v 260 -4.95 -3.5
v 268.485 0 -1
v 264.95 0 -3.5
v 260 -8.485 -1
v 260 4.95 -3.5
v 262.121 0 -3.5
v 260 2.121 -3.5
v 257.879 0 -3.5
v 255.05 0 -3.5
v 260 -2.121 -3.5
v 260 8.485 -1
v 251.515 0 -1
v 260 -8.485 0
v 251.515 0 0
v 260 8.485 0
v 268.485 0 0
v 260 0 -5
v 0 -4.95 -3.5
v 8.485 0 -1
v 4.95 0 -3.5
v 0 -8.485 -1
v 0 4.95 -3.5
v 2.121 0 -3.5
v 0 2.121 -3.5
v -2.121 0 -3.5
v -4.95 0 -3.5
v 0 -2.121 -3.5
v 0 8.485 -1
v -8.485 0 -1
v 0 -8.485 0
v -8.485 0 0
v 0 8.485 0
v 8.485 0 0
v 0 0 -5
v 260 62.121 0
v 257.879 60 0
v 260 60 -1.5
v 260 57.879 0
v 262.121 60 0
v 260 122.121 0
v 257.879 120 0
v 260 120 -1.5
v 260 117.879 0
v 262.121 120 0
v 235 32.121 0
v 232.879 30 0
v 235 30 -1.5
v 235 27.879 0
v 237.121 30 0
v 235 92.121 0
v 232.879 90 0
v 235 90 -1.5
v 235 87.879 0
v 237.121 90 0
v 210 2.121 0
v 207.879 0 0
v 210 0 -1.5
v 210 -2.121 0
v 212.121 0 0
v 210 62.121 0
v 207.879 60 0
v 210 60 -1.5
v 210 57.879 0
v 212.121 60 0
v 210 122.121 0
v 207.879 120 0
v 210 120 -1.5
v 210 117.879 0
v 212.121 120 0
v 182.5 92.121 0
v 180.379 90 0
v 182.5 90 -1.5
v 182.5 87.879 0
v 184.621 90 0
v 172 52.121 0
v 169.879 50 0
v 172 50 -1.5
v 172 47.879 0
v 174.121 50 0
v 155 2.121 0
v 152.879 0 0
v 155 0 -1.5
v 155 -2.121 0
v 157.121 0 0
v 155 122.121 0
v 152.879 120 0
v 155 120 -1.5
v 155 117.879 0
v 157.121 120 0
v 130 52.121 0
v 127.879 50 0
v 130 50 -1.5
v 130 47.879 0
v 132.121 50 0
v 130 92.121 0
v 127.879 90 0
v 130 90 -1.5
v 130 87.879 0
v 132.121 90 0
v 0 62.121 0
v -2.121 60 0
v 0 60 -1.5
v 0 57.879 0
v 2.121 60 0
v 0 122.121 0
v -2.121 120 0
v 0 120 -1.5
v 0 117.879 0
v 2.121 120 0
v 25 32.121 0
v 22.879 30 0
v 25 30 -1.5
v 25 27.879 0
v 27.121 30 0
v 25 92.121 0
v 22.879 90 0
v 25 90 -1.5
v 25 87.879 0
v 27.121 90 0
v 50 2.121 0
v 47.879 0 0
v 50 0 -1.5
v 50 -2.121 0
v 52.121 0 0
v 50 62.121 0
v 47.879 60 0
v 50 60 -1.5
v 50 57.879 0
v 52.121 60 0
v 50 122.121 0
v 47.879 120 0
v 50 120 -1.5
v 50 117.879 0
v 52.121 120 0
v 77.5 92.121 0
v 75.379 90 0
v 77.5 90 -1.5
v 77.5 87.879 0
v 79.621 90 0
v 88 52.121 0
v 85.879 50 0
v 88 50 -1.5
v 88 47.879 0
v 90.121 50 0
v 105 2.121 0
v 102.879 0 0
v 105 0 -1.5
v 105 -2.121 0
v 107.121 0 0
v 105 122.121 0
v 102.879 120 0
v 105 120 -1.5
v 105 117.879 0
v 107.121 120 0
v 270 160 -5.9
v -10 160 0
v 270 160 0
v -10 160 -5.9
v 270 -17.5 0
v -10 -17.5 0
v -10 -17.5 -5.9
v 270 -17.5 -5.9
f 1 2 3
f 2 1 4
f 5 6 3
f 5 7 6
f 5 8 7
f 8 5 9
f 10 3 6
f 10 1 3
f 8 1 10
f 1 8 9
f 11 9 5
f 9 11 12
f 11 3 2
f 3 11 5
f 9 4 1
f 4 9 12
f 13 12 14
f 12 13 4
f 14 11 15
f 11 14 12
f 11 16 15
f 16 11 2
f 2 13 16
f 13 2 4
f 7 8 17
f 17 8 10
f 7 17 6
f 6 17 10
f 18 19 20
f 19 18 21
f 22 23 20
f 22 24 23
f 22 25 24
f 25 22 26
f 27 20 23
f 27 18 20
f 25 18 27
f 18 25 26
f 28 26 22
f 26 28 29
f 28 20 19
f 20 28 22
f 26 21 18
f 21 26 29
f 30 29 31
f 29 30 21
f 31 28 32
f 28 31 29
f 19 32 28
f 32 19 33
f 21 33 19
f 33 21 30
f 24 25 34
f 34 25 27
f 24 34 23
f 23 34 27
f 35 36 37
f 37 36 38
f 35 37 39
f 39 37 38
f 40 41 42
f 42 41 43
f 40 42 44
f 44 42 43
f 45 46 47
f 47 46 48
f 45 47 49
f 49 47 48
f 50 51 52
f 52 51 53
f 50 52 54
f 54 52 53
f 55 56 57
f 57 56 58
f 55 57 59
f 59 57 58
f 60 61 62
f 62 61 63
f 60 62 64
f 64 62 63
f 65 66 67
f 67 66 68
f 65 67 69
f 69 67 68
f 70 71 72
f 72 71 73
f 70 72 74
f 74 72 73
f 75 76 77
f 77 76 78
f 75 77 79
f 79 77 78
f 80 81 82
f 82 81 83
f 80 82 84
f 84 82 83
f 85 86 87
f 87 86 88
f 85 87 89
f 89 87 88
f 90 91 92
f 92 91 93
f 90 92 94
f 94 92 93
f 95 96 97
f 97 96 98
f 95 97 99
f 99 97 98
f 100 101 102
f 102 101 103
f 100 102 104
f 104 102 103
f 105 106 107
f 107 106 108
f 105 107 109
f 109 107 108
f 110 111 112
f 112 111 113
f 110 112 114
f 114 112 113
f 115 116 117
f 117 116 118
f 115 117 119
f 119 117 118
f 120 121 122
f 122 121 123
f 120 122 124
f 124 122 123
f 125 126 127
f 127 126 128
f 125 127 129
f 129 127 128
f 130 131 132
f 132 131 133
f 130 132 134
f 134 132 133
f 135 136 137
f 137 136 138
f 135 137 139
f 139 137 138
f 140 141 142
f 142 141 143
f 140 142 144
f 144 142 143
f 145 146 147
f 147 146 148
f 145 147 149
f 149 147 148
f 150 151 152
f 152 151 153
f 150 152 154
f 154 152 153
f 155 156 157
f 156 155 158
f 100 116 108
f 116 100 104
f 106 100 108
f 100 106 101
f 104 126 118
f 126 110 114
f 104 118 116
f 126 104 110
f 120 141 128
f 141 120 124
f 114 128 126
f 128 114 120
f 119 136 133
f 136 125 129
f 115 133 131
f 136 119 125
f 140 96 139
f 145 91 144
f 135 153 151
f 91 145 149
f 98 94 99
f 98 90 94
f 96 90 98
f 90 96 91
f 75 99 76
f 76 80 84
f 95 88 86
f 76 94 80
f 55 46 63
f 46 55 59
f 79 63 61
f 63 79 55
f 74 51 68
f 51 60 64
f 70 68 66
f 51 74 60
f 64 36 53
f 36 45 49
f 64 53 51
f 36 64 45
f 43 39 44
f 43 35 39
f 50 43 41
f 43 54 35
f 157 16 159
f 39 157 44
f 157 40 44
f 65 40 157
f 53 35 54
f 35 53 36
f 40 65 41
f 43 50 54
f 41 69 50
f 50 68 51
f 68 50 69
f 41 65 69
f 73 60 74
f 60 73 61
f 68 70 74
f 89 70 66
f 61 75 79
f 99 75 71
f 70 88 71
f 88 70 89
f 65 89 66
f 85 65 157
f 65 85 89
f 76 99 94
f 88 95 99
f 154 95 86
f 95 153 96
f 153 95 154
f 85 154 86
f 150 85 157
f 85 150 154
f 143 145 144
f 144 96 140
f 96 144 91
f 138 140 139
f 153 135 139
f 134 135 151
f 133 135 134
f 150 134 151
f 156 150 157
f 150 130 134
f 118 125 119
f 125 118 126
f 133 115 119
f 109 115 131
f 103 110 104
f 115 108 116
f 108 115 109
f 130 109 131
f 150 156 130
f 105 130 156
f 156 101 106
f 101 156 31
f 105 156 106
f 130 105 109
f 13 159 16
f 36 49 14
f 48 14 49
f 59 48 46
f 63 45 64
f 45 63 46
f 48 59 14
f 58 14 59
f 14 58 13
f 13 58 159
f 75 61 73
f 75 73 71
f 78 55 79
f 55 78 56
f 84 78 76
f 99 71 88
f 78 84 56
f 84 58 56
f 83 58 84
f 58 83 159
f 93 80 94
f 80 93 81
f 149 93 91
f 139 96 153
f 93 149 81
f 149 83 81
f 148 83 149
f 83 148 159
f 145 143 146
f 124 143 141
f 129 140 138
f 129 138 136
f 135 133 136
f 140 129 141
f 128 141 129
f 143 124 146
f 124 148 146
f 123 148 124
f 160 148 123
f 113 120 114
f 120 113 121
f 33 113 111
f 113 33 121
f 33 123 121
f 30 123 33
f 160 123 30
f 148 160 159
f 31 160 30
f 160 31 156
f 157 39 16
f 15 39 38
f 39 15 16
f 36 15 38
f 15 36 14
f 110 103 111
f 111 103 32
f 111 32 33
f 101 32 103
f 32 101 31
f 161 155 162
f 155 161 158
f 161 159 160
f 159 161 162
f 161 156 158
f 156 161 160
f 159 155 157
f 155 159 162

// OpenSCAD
/*
For this file only:

MIT License

Copyright (c) 2023  Evgeny Balashov https://www.linkedin.com/in/balashovevgeny/
Original source and latest versions: https://github.com/heavior/parametric-spoilboard

Permission is hereby granted, free of charge, to any person obtaining a copy
of this software and associated documentation files (the "Software"), to deal
in the Software without restriction, including without limitation the rights
to use, copy, modify, merge, publish, distribute, sublicense, and/or sell
copies of the Software, and to permit persons to whom the Software is
furnished to do so, subject to the following conditions:

The above copyright notice and this permission notice shall be included in all
copies or substantial portions of the Software.

THE SOFTWARE IS PROVIDED "AS IS", WITHOUT WARRANTY OF ANY KIND, EXPRESS OR
IMPLIED, INCLUDING BUT NOT LIMITED TO THE WARRANTIES OF MERCHANTABILITY,
FITNESS FOR A PARTICULAR PURPOSE AND NONINFRINGEMENT. IN NO EVENT SHALL THE
AUTHORS OR COPYRIGHT HOLDERS BE LIABLE FOR ANY CLAIM, DAMAGES OR OTHER
LIABILITY, WHETHER IN AN ACTION OF CONTRACT, TORT OR OTHERWISE, ARISING FROM,
OUT OF OR IN CONNECTION WITH THE SOFTWARE OR THE USE OR OTHER DEALINGS IN THE
SOFTWARE.
*/

/*
# Parametric OpenSCAD model for generating CNC spoilboards and Sainsmart Genmitsu 3030-Pro cnc bed grid pattern

Readme file with more details available here: https://github.com/heavior/parametric-spoilboard

How to use:
1) Configure holes and other parameters at the beginning of the file
2) Export STL
3) Use you preferred CAD software to create G-code
4) Use your CNC to prepare the board

Manufacturing:

If you are maximizing spoilboard size, your CNC x/y range is likely not wide enough to make the model in one pass, and you will need two runs.

Instruction for Genmitsu 3030-Pro (for other CNC mills, read this and get creative): 
* Set turnModel = true , it will turn the model to make it easier to prepare in CAM
* Set twoPassMilling = true, it will optimise the render for a two-pass milling

* Mark a corner hole (X,Y zero) on the board. You will find coordinates in the output log (console) during rendering, look for "Mark the zero on spoilboard". This is important to get it right, as any error will double during production
* Align and secure a 90 degree clamp on the cnc bed. It will serve as a reference for the process
* Position the board in portrait orientation using clamp, secure it. Check that no mounting hardware intervenes with expected holes or mill head moving
* Align X,Y zero on that hole mark
* Set Z zero on the board top (controlled bty zeroZonSpoilboardSurface parameter)
* In the CAM software make sure that model's zero is preserved (it should be on the first hole)
* When preparing routes - make sure bit doesn't bump into clamps (obviously)

* Run first pass, release the board
* Turn the board 180 degrees, and secure it back the same way
* With 90 degree clamp, you should not need to change zero position
* Run the pass again

* If you were not using through holes, finish the holes with a drill slightly thicker than the threads on the bed.


If you don't have a 90 degree clamp to secure on the board, just make one! :)
Altenratively, you can mark two opposize corners on the board, and reset zero on those markings between passes. You need to be accurate in your markings. Measure thrice!



Outlining path in Autodesk Fusion if you are using drill marks:
# import STL as mesh
# Modify -> Convert mesh
# Manufacture: 
# For tool, set non-zero tip size

# Create path for chamfer: 2D pocket
## select inner large contours as Geometry
## select outer contours as Stock Contours

# path for drill marks: drill
## select centers of each mark including chamfers as points
## order points by X

Think: maybe make CNC mark the zero for the second pass
TODO: fix hole pattern, it doesn't really fit!
TODO: imrpove drill holes marking - make it deeper

*/

renderBed = false; // Use for debug and visualisation, set to false before export
renderSpoilboard = true; // set to true for export, set to false to validate spoilboard design
centerAroundFirstSpoilboardHole = true; // if true, center the fist hole
turnModel = true; // Turn model 90 degrees for easier alignment. See instruction to see how it works
twoPassMilling = true; // render only half of the model (split by X) for two-step marking process

markDrillHoles = true;  // Set to true if you want hole marks for drill, false if you want CNC to complete the holes
zeroZonSpoilboardSurface = true;  // if set to false, the Z zero will be set on the milling bed

$fn = 4; // circles are rendered as regular n-gons, with n=$fn
         // lower value makes it easier to work in CAM software for post processing
         // higher value improves precision
         
compensateForCircularPrecision = true;  // when using low $fn, this might be important:
    // Since circles are rendered as n-gons, their effective size is smaller than expected. This compensates for that
compensateRadiusCoefficient = compensateForCircularPrecision?1/cos(180/$fn):1;



// Screw that mounts spoilboard to the bed:
screwCountersunkDepth = 3.5; // Set to 0 if don't want machined countersink or pocket at all
screwHeadWidth = 12;         // screw head diameter. If you want - add some tolerance
screwCountersunkAngle = 90;  // 90 is default for metric screws. set to 0 for straight pocket   

validateCountersunkDepth = true; // this checks that there is enough depth for the countersink
// change this value only if you understand what you are doing, the countersunk will probably render not the way you expectwant
        
spoilboardMetricThread = 6; // mm
holeDiameter = spoilboardMetricThread + 1; // allowing some wiggle room 
chamferHolesDepth = .5; // chamfer each hole to this depth. set to 0 to skip
chamferHolesAngle = screwCountersunkAngle; 

//cnc bed dimensions
bedXdimension = 360;
bedYdimension = 300;

// it's ok to use smaller spoilboard sheet, the pattern will be centered
spoilboardSheetXdimenstion = 355;
spoilboardSheetYdimenstion = 280;
// Mark the zero on spoilboard - X: 17.5 Y: 10

spoilboardSheetThickness = 5.9;
holeMaxDepth = spoilboardSheetThickness + 2; // if you don't want through holes, limit this number to protect your bed
holeDefaultDepth = holeMaxDepth;

holeMarkAngle = 90; // 0 for vertical holes. 
                    // Match to the mill bit tool you want to use, or to the drill bit tip.
                    // The most common included angles for drills are 118° and 135° (for hardened steel).
holeMarkWidth = 3;  // match to the drill bit size
holeMarkDepth = 4.5;
/*
    Here is how to use drill holes:
    1) set markDrillHoles = true
    2) set holeMarkAngle
        for easiest drilling - match it to the drill tip angle or set lower
        for easiest milling - match to your working cnc bit (V-groove, probably)
    3) set holeMarkWidth
        for easiest milling - match to your working bit thickness
    Note: holeMarkDepth is a limiting factor if your holeMarkAngle is too sharp. 
    Rendering will prioritise holeMarkAngle over holeMarkWidth
*/

                    
spoilboardEdgeKeepOut = 6; // How close can a hole get to the edge of spoilboard for integrity (counterink can overflow into that zone)
centerSpoilboard = true;   // set to false if you want to move spoilboard around the board
// if centerSpoilboard=false, change next two variables as needed:
spoilboardCornerX = (bedXdimension - spoilboardSheetXdimenstion)/2;     
spoilboardCornerY = (bedYdimension - spoilboardSheetYdimenstion)/2;
//Spoilboard corner on the bed - X: 2.5 Y: 10


// cnc beds have irregular hole patterns, but tend to be symmetrical. 
// This allows us to set hole pattern only for one corner, and script will calculate 
boardXsymmetrical = true; 
boardYsymmetrical = true;

// Now go through the holes on not symmetrical and set up
// [X,Y,mount] hole _centers_ measured from the edge of cnc bed
// try to be within 1mm precision
// third parameter is true or false. true if it will be used to secure Spoilboard on the bed
holes = [
//row 1
    [20,20,true], // true marks holes used to mount Spoilboard to the bed, they will get shapmher 
    [80,20],
    [140,20],

//row 2
    [50,45],
    [110,45],

//row 3
    [20,70],
    [80,70],
    [140,70],

//row 4
    [110,97.5],

//row 5
    [70,108],

//row 6
    [20,125],
    [140,125],

//row 7
    [70,bedYdimension/2],
    [110,bedYdimension/2],

];



// Technical parameters, not important
cutoutdelta=1;// eny positive number shouldwork
supportOversizeSpoilboard = false; // this checks that Spoilboard sheet is smaller than the board. 
                                   // change this value only if you understand what you are doing

if(!supportOversizeSpoilboard){
    assert(bedXdimension>=spoilboardSheetXdimenstion, "spoilboard is too wide for X axis"); 
    assert(bedYdimension>=spoilboardSheetYdimenstion, "spoilboard is too long for Y axis");
}

if(validateCountersunkDepth && screwCountersunkDepth>0){
    assert(screwCountersunkDepth <= holeMaxDepth, 
        str("max hole depth is not deep enough for countrsunk, min holeMaxDepth: ", screwCountersunkDepth));
    assert(screwCountersunkAngle >= 0, "negative countersunk angle");
    assert(screwCountersunkAngle < 180, "countersunk angle is too large");
    //assert(screwCountersunkAngle <= 90, "countersunk angle above 90 is not supported yet");
    
    if(screwCountersunkAngle > 0){
        requiredCounterSunkDepth = (screwHeadWidth - holeDiameter)/2/tan(screwCountersunkAngle/2);
        assert(requiredCounterSunkDepth <= screwCountersunkDepth, str("countersunk is too shallow for this angle, min screwCountersunkDepth: ",requiredCounterSunkDepth));
    }
}

// completing holes array with symmetrical values
holes2 = [
    for (elem = holes) elem,
    if(boardXsymmetrical) for (elem = holes) [ bedXdimension-elem[0], elem[1], elem[2]]
];
bedHoles = [
    for (elem = holes2) elem,
    if(boardYsymmetrical) for (elem = holes2) [ elem[0], bedYdimension-elem[1], elem[2]]
];



spoilboardXShift = centerSpoilboard?(bedXdimension - spoilboardSheetXdimenstion)/2:spoilboardCornerX;
spoilboardYShift = centerSpoilboard?(bedYdimension - spoilboardSheetYdimenstion)/2:spoilboardCornerY;
spoilboardHolesRaw = [ for (elem = bedHoles) [elem[0] - spoilboardXShift,elem[1] - spoilboardYShift, elem[2]]];
    
realKeepout = spoilboardEdgeKeepOut + holeDiameter/2;
function spoilboardHoleCheck(hole) = 
    hole[0] >= realKeepout 
    && hole[1] >= realKeepout 
    && hole[0] <= spoilboardSheetXdimenstion - realKeepout 
    && hole[1] <= spoilboardSheetYdimenstion - realKeepout;    
spoilboardHoles = [ for (elem = spoilboardHolesRaw) if(spoilboardHoleCheck(elem)) elem]; // remove holes that are too close to the edge
    

module compensateCylinder(){
    
    // cylinder(h = height, r1 = BottomRadius, r2 = TopRadius, center = true/false);
    //  cylinder(h=15, d1=20, d2=0, center=true);
    /*
    equivalent scripts
 cylinder(h=20, r=10, center=true);
 cylinder(  20,   10, 10,true);
 cylinder(  20, d=20, center=true);
 cylinder(  20,r1=10, d2=20, center=true);
 cylinder(  20,r1=10, d2=2*10, center=true);
    */
    
    
}

module RenderHoles(array, depth){
    
    counterDepth = screwCountersunkDepth;
    countersunkOuterRadius = screwHeadWidth/2;
    countersunkInnerRadius = holeDiameter/2;
    
    chamferOuterRadius = holeDiameter/2 + chamferHolesDepth*tan(chamferHolesAngle/2);
                    
    coneDepth = screwCountersunkAngle>0?
        (countersunkOuterRadius - holeDiameter/2)/tan(screwCountersunkAngle/2):counterDepth;
    
    if(screwCountersunkDepth>0){
        assert(coneDepth <= counterDepth,"Countersink hole is not deep enough for this angle");
    }
    
    cylinderDepth = counterDepth - coneDepth;
    
    holeMarkRealDepth = min(depth,holeMarkAngle>0?min(holeMarkDepth,holeMarkWidth/tan(holeMarkAngle/2)/2):holeMarkDepth);
    holeMarkRadius = (holeMarkRealDepth+cutoutdelta/2)*tan(holeMarkAngle/2);
    
    for(hole = array){
        translate([hole[0],hole[1],0]){
            
            if(markDrillHoles){ // render drill marks
                translate([0,0,-holeMarkRealDepth])
                    cylinder(r1 = 0, r2 = holeMarkRadius*compensateRadiusCoefficient, h = holeMarkRealDepth+cutoutdelta/2);
                
            }else{  // render holes
                translate([0,0,-depth])
                    cylinder(d=holeDiameter*compensateRadiusCoefficient, h = depth+cutoutdelta/2);
                
                
                if(!hole[2] && chamferHolesDepth>0){ // chamfer holes
                    
                    translate([0,0,-chamferHolesDepth])
                        cylinder(r1=holeDiameter/2*compensateRadiusCoefficient, r2=chamferOuterRadius*compensateRadiusCoefficient, h = chamferHolesDepth+cutoutdelta/2);
                }

            }
            
            if(hole[2] && screwCountersunkDepth>0){ //render countersinks
                translate([0,0,-counterDepth])
                    cylinder(r1 = countersunkInnerRadius*compensateRadiusCoefficient, 
                             r2 = countersunkOuterRadius*compensateRadiusCoefficient, 
                             h = coneDepth*1.0001);
                
                if(cylinderDepth>0){
                    translate([0,0,-cylinderDepth])
                        cylinder(r=countersunkOuterRadius*compensateRadiusCoefficient, h = cylinderDepth+cutoutdelta/2);
                }
                
                if(markDrillHoles){
                    translate([0,0,max(-counterDepth-holeMarkRealDepth,-depth)]) // don't sink too deep
                        cylinder(r1 = 0, r2 = holeMarkRadius*compensateRadiusCoefficient, h = holeMarkRealDepth+cutoutdelta/2);
                }
            }
        }
    }
}

module RenderBed(){
    difference(){
        cube([bedXdimension,bedYdimension,spoilboardSheetThickness]);
         for(hole = bedHoles){
            translate([hole[0],hole[1],-cutoutdelta/2])
                cylinder(d=spoilboardMetricThread*compensateRadiusCoefficient, h = spoilboardSheetThickness+cutoutdelta);
        }
    }
}

module RenderSheet(){
    difference(){
        cube([twoPassMilling?spoilboardSheetXdimenstion/2:spoilboardSheetXdimenstion,spoilboardSheetYdimenstion,spoilboardSheetThickness]);
        translate([0,0,spoilboardSheetThickness])
            RenderHoles(spoilboardHoles,min(holeMaxDepth,spoilboardSheetThickness+cutoutdelta));
    }
}


echo(str("Mark the zero on spoilboard - X: ",spoilboardHoles[0][0]," Y: ",spoilboardHoles[0][1]));
echo(str("Spoilboard corner on the bed - X: ",spoilboardXShift," Y: ",spoilboardYShift));

centerX = centerAroundFirstSpoilboardHole? spoilboardHoles[0][0] + spoilboardXShift:0;
centerY = centerAroundFirstSpoilboardHole? spoilboardHoles[0][1] + spoilboardYShift:0;

rotate([0,0,turnModel?90:0]) 
    translate([-centerX,(turnModel?-bedYdimension+centerY:-centerY),zeroZonSpoilboardSurface?-spoilboardSheetThickness:0]){    
        if(renderBed){
            color("gray")
            translate([0,0,-spoilboardSheetThickness])
                RenderBed();
        }
        if(renderSpoilboard){
            translate([spoilboardXShift,spoilboardYShift,0]){
                RenderSheet();   
            }
        }
    }
